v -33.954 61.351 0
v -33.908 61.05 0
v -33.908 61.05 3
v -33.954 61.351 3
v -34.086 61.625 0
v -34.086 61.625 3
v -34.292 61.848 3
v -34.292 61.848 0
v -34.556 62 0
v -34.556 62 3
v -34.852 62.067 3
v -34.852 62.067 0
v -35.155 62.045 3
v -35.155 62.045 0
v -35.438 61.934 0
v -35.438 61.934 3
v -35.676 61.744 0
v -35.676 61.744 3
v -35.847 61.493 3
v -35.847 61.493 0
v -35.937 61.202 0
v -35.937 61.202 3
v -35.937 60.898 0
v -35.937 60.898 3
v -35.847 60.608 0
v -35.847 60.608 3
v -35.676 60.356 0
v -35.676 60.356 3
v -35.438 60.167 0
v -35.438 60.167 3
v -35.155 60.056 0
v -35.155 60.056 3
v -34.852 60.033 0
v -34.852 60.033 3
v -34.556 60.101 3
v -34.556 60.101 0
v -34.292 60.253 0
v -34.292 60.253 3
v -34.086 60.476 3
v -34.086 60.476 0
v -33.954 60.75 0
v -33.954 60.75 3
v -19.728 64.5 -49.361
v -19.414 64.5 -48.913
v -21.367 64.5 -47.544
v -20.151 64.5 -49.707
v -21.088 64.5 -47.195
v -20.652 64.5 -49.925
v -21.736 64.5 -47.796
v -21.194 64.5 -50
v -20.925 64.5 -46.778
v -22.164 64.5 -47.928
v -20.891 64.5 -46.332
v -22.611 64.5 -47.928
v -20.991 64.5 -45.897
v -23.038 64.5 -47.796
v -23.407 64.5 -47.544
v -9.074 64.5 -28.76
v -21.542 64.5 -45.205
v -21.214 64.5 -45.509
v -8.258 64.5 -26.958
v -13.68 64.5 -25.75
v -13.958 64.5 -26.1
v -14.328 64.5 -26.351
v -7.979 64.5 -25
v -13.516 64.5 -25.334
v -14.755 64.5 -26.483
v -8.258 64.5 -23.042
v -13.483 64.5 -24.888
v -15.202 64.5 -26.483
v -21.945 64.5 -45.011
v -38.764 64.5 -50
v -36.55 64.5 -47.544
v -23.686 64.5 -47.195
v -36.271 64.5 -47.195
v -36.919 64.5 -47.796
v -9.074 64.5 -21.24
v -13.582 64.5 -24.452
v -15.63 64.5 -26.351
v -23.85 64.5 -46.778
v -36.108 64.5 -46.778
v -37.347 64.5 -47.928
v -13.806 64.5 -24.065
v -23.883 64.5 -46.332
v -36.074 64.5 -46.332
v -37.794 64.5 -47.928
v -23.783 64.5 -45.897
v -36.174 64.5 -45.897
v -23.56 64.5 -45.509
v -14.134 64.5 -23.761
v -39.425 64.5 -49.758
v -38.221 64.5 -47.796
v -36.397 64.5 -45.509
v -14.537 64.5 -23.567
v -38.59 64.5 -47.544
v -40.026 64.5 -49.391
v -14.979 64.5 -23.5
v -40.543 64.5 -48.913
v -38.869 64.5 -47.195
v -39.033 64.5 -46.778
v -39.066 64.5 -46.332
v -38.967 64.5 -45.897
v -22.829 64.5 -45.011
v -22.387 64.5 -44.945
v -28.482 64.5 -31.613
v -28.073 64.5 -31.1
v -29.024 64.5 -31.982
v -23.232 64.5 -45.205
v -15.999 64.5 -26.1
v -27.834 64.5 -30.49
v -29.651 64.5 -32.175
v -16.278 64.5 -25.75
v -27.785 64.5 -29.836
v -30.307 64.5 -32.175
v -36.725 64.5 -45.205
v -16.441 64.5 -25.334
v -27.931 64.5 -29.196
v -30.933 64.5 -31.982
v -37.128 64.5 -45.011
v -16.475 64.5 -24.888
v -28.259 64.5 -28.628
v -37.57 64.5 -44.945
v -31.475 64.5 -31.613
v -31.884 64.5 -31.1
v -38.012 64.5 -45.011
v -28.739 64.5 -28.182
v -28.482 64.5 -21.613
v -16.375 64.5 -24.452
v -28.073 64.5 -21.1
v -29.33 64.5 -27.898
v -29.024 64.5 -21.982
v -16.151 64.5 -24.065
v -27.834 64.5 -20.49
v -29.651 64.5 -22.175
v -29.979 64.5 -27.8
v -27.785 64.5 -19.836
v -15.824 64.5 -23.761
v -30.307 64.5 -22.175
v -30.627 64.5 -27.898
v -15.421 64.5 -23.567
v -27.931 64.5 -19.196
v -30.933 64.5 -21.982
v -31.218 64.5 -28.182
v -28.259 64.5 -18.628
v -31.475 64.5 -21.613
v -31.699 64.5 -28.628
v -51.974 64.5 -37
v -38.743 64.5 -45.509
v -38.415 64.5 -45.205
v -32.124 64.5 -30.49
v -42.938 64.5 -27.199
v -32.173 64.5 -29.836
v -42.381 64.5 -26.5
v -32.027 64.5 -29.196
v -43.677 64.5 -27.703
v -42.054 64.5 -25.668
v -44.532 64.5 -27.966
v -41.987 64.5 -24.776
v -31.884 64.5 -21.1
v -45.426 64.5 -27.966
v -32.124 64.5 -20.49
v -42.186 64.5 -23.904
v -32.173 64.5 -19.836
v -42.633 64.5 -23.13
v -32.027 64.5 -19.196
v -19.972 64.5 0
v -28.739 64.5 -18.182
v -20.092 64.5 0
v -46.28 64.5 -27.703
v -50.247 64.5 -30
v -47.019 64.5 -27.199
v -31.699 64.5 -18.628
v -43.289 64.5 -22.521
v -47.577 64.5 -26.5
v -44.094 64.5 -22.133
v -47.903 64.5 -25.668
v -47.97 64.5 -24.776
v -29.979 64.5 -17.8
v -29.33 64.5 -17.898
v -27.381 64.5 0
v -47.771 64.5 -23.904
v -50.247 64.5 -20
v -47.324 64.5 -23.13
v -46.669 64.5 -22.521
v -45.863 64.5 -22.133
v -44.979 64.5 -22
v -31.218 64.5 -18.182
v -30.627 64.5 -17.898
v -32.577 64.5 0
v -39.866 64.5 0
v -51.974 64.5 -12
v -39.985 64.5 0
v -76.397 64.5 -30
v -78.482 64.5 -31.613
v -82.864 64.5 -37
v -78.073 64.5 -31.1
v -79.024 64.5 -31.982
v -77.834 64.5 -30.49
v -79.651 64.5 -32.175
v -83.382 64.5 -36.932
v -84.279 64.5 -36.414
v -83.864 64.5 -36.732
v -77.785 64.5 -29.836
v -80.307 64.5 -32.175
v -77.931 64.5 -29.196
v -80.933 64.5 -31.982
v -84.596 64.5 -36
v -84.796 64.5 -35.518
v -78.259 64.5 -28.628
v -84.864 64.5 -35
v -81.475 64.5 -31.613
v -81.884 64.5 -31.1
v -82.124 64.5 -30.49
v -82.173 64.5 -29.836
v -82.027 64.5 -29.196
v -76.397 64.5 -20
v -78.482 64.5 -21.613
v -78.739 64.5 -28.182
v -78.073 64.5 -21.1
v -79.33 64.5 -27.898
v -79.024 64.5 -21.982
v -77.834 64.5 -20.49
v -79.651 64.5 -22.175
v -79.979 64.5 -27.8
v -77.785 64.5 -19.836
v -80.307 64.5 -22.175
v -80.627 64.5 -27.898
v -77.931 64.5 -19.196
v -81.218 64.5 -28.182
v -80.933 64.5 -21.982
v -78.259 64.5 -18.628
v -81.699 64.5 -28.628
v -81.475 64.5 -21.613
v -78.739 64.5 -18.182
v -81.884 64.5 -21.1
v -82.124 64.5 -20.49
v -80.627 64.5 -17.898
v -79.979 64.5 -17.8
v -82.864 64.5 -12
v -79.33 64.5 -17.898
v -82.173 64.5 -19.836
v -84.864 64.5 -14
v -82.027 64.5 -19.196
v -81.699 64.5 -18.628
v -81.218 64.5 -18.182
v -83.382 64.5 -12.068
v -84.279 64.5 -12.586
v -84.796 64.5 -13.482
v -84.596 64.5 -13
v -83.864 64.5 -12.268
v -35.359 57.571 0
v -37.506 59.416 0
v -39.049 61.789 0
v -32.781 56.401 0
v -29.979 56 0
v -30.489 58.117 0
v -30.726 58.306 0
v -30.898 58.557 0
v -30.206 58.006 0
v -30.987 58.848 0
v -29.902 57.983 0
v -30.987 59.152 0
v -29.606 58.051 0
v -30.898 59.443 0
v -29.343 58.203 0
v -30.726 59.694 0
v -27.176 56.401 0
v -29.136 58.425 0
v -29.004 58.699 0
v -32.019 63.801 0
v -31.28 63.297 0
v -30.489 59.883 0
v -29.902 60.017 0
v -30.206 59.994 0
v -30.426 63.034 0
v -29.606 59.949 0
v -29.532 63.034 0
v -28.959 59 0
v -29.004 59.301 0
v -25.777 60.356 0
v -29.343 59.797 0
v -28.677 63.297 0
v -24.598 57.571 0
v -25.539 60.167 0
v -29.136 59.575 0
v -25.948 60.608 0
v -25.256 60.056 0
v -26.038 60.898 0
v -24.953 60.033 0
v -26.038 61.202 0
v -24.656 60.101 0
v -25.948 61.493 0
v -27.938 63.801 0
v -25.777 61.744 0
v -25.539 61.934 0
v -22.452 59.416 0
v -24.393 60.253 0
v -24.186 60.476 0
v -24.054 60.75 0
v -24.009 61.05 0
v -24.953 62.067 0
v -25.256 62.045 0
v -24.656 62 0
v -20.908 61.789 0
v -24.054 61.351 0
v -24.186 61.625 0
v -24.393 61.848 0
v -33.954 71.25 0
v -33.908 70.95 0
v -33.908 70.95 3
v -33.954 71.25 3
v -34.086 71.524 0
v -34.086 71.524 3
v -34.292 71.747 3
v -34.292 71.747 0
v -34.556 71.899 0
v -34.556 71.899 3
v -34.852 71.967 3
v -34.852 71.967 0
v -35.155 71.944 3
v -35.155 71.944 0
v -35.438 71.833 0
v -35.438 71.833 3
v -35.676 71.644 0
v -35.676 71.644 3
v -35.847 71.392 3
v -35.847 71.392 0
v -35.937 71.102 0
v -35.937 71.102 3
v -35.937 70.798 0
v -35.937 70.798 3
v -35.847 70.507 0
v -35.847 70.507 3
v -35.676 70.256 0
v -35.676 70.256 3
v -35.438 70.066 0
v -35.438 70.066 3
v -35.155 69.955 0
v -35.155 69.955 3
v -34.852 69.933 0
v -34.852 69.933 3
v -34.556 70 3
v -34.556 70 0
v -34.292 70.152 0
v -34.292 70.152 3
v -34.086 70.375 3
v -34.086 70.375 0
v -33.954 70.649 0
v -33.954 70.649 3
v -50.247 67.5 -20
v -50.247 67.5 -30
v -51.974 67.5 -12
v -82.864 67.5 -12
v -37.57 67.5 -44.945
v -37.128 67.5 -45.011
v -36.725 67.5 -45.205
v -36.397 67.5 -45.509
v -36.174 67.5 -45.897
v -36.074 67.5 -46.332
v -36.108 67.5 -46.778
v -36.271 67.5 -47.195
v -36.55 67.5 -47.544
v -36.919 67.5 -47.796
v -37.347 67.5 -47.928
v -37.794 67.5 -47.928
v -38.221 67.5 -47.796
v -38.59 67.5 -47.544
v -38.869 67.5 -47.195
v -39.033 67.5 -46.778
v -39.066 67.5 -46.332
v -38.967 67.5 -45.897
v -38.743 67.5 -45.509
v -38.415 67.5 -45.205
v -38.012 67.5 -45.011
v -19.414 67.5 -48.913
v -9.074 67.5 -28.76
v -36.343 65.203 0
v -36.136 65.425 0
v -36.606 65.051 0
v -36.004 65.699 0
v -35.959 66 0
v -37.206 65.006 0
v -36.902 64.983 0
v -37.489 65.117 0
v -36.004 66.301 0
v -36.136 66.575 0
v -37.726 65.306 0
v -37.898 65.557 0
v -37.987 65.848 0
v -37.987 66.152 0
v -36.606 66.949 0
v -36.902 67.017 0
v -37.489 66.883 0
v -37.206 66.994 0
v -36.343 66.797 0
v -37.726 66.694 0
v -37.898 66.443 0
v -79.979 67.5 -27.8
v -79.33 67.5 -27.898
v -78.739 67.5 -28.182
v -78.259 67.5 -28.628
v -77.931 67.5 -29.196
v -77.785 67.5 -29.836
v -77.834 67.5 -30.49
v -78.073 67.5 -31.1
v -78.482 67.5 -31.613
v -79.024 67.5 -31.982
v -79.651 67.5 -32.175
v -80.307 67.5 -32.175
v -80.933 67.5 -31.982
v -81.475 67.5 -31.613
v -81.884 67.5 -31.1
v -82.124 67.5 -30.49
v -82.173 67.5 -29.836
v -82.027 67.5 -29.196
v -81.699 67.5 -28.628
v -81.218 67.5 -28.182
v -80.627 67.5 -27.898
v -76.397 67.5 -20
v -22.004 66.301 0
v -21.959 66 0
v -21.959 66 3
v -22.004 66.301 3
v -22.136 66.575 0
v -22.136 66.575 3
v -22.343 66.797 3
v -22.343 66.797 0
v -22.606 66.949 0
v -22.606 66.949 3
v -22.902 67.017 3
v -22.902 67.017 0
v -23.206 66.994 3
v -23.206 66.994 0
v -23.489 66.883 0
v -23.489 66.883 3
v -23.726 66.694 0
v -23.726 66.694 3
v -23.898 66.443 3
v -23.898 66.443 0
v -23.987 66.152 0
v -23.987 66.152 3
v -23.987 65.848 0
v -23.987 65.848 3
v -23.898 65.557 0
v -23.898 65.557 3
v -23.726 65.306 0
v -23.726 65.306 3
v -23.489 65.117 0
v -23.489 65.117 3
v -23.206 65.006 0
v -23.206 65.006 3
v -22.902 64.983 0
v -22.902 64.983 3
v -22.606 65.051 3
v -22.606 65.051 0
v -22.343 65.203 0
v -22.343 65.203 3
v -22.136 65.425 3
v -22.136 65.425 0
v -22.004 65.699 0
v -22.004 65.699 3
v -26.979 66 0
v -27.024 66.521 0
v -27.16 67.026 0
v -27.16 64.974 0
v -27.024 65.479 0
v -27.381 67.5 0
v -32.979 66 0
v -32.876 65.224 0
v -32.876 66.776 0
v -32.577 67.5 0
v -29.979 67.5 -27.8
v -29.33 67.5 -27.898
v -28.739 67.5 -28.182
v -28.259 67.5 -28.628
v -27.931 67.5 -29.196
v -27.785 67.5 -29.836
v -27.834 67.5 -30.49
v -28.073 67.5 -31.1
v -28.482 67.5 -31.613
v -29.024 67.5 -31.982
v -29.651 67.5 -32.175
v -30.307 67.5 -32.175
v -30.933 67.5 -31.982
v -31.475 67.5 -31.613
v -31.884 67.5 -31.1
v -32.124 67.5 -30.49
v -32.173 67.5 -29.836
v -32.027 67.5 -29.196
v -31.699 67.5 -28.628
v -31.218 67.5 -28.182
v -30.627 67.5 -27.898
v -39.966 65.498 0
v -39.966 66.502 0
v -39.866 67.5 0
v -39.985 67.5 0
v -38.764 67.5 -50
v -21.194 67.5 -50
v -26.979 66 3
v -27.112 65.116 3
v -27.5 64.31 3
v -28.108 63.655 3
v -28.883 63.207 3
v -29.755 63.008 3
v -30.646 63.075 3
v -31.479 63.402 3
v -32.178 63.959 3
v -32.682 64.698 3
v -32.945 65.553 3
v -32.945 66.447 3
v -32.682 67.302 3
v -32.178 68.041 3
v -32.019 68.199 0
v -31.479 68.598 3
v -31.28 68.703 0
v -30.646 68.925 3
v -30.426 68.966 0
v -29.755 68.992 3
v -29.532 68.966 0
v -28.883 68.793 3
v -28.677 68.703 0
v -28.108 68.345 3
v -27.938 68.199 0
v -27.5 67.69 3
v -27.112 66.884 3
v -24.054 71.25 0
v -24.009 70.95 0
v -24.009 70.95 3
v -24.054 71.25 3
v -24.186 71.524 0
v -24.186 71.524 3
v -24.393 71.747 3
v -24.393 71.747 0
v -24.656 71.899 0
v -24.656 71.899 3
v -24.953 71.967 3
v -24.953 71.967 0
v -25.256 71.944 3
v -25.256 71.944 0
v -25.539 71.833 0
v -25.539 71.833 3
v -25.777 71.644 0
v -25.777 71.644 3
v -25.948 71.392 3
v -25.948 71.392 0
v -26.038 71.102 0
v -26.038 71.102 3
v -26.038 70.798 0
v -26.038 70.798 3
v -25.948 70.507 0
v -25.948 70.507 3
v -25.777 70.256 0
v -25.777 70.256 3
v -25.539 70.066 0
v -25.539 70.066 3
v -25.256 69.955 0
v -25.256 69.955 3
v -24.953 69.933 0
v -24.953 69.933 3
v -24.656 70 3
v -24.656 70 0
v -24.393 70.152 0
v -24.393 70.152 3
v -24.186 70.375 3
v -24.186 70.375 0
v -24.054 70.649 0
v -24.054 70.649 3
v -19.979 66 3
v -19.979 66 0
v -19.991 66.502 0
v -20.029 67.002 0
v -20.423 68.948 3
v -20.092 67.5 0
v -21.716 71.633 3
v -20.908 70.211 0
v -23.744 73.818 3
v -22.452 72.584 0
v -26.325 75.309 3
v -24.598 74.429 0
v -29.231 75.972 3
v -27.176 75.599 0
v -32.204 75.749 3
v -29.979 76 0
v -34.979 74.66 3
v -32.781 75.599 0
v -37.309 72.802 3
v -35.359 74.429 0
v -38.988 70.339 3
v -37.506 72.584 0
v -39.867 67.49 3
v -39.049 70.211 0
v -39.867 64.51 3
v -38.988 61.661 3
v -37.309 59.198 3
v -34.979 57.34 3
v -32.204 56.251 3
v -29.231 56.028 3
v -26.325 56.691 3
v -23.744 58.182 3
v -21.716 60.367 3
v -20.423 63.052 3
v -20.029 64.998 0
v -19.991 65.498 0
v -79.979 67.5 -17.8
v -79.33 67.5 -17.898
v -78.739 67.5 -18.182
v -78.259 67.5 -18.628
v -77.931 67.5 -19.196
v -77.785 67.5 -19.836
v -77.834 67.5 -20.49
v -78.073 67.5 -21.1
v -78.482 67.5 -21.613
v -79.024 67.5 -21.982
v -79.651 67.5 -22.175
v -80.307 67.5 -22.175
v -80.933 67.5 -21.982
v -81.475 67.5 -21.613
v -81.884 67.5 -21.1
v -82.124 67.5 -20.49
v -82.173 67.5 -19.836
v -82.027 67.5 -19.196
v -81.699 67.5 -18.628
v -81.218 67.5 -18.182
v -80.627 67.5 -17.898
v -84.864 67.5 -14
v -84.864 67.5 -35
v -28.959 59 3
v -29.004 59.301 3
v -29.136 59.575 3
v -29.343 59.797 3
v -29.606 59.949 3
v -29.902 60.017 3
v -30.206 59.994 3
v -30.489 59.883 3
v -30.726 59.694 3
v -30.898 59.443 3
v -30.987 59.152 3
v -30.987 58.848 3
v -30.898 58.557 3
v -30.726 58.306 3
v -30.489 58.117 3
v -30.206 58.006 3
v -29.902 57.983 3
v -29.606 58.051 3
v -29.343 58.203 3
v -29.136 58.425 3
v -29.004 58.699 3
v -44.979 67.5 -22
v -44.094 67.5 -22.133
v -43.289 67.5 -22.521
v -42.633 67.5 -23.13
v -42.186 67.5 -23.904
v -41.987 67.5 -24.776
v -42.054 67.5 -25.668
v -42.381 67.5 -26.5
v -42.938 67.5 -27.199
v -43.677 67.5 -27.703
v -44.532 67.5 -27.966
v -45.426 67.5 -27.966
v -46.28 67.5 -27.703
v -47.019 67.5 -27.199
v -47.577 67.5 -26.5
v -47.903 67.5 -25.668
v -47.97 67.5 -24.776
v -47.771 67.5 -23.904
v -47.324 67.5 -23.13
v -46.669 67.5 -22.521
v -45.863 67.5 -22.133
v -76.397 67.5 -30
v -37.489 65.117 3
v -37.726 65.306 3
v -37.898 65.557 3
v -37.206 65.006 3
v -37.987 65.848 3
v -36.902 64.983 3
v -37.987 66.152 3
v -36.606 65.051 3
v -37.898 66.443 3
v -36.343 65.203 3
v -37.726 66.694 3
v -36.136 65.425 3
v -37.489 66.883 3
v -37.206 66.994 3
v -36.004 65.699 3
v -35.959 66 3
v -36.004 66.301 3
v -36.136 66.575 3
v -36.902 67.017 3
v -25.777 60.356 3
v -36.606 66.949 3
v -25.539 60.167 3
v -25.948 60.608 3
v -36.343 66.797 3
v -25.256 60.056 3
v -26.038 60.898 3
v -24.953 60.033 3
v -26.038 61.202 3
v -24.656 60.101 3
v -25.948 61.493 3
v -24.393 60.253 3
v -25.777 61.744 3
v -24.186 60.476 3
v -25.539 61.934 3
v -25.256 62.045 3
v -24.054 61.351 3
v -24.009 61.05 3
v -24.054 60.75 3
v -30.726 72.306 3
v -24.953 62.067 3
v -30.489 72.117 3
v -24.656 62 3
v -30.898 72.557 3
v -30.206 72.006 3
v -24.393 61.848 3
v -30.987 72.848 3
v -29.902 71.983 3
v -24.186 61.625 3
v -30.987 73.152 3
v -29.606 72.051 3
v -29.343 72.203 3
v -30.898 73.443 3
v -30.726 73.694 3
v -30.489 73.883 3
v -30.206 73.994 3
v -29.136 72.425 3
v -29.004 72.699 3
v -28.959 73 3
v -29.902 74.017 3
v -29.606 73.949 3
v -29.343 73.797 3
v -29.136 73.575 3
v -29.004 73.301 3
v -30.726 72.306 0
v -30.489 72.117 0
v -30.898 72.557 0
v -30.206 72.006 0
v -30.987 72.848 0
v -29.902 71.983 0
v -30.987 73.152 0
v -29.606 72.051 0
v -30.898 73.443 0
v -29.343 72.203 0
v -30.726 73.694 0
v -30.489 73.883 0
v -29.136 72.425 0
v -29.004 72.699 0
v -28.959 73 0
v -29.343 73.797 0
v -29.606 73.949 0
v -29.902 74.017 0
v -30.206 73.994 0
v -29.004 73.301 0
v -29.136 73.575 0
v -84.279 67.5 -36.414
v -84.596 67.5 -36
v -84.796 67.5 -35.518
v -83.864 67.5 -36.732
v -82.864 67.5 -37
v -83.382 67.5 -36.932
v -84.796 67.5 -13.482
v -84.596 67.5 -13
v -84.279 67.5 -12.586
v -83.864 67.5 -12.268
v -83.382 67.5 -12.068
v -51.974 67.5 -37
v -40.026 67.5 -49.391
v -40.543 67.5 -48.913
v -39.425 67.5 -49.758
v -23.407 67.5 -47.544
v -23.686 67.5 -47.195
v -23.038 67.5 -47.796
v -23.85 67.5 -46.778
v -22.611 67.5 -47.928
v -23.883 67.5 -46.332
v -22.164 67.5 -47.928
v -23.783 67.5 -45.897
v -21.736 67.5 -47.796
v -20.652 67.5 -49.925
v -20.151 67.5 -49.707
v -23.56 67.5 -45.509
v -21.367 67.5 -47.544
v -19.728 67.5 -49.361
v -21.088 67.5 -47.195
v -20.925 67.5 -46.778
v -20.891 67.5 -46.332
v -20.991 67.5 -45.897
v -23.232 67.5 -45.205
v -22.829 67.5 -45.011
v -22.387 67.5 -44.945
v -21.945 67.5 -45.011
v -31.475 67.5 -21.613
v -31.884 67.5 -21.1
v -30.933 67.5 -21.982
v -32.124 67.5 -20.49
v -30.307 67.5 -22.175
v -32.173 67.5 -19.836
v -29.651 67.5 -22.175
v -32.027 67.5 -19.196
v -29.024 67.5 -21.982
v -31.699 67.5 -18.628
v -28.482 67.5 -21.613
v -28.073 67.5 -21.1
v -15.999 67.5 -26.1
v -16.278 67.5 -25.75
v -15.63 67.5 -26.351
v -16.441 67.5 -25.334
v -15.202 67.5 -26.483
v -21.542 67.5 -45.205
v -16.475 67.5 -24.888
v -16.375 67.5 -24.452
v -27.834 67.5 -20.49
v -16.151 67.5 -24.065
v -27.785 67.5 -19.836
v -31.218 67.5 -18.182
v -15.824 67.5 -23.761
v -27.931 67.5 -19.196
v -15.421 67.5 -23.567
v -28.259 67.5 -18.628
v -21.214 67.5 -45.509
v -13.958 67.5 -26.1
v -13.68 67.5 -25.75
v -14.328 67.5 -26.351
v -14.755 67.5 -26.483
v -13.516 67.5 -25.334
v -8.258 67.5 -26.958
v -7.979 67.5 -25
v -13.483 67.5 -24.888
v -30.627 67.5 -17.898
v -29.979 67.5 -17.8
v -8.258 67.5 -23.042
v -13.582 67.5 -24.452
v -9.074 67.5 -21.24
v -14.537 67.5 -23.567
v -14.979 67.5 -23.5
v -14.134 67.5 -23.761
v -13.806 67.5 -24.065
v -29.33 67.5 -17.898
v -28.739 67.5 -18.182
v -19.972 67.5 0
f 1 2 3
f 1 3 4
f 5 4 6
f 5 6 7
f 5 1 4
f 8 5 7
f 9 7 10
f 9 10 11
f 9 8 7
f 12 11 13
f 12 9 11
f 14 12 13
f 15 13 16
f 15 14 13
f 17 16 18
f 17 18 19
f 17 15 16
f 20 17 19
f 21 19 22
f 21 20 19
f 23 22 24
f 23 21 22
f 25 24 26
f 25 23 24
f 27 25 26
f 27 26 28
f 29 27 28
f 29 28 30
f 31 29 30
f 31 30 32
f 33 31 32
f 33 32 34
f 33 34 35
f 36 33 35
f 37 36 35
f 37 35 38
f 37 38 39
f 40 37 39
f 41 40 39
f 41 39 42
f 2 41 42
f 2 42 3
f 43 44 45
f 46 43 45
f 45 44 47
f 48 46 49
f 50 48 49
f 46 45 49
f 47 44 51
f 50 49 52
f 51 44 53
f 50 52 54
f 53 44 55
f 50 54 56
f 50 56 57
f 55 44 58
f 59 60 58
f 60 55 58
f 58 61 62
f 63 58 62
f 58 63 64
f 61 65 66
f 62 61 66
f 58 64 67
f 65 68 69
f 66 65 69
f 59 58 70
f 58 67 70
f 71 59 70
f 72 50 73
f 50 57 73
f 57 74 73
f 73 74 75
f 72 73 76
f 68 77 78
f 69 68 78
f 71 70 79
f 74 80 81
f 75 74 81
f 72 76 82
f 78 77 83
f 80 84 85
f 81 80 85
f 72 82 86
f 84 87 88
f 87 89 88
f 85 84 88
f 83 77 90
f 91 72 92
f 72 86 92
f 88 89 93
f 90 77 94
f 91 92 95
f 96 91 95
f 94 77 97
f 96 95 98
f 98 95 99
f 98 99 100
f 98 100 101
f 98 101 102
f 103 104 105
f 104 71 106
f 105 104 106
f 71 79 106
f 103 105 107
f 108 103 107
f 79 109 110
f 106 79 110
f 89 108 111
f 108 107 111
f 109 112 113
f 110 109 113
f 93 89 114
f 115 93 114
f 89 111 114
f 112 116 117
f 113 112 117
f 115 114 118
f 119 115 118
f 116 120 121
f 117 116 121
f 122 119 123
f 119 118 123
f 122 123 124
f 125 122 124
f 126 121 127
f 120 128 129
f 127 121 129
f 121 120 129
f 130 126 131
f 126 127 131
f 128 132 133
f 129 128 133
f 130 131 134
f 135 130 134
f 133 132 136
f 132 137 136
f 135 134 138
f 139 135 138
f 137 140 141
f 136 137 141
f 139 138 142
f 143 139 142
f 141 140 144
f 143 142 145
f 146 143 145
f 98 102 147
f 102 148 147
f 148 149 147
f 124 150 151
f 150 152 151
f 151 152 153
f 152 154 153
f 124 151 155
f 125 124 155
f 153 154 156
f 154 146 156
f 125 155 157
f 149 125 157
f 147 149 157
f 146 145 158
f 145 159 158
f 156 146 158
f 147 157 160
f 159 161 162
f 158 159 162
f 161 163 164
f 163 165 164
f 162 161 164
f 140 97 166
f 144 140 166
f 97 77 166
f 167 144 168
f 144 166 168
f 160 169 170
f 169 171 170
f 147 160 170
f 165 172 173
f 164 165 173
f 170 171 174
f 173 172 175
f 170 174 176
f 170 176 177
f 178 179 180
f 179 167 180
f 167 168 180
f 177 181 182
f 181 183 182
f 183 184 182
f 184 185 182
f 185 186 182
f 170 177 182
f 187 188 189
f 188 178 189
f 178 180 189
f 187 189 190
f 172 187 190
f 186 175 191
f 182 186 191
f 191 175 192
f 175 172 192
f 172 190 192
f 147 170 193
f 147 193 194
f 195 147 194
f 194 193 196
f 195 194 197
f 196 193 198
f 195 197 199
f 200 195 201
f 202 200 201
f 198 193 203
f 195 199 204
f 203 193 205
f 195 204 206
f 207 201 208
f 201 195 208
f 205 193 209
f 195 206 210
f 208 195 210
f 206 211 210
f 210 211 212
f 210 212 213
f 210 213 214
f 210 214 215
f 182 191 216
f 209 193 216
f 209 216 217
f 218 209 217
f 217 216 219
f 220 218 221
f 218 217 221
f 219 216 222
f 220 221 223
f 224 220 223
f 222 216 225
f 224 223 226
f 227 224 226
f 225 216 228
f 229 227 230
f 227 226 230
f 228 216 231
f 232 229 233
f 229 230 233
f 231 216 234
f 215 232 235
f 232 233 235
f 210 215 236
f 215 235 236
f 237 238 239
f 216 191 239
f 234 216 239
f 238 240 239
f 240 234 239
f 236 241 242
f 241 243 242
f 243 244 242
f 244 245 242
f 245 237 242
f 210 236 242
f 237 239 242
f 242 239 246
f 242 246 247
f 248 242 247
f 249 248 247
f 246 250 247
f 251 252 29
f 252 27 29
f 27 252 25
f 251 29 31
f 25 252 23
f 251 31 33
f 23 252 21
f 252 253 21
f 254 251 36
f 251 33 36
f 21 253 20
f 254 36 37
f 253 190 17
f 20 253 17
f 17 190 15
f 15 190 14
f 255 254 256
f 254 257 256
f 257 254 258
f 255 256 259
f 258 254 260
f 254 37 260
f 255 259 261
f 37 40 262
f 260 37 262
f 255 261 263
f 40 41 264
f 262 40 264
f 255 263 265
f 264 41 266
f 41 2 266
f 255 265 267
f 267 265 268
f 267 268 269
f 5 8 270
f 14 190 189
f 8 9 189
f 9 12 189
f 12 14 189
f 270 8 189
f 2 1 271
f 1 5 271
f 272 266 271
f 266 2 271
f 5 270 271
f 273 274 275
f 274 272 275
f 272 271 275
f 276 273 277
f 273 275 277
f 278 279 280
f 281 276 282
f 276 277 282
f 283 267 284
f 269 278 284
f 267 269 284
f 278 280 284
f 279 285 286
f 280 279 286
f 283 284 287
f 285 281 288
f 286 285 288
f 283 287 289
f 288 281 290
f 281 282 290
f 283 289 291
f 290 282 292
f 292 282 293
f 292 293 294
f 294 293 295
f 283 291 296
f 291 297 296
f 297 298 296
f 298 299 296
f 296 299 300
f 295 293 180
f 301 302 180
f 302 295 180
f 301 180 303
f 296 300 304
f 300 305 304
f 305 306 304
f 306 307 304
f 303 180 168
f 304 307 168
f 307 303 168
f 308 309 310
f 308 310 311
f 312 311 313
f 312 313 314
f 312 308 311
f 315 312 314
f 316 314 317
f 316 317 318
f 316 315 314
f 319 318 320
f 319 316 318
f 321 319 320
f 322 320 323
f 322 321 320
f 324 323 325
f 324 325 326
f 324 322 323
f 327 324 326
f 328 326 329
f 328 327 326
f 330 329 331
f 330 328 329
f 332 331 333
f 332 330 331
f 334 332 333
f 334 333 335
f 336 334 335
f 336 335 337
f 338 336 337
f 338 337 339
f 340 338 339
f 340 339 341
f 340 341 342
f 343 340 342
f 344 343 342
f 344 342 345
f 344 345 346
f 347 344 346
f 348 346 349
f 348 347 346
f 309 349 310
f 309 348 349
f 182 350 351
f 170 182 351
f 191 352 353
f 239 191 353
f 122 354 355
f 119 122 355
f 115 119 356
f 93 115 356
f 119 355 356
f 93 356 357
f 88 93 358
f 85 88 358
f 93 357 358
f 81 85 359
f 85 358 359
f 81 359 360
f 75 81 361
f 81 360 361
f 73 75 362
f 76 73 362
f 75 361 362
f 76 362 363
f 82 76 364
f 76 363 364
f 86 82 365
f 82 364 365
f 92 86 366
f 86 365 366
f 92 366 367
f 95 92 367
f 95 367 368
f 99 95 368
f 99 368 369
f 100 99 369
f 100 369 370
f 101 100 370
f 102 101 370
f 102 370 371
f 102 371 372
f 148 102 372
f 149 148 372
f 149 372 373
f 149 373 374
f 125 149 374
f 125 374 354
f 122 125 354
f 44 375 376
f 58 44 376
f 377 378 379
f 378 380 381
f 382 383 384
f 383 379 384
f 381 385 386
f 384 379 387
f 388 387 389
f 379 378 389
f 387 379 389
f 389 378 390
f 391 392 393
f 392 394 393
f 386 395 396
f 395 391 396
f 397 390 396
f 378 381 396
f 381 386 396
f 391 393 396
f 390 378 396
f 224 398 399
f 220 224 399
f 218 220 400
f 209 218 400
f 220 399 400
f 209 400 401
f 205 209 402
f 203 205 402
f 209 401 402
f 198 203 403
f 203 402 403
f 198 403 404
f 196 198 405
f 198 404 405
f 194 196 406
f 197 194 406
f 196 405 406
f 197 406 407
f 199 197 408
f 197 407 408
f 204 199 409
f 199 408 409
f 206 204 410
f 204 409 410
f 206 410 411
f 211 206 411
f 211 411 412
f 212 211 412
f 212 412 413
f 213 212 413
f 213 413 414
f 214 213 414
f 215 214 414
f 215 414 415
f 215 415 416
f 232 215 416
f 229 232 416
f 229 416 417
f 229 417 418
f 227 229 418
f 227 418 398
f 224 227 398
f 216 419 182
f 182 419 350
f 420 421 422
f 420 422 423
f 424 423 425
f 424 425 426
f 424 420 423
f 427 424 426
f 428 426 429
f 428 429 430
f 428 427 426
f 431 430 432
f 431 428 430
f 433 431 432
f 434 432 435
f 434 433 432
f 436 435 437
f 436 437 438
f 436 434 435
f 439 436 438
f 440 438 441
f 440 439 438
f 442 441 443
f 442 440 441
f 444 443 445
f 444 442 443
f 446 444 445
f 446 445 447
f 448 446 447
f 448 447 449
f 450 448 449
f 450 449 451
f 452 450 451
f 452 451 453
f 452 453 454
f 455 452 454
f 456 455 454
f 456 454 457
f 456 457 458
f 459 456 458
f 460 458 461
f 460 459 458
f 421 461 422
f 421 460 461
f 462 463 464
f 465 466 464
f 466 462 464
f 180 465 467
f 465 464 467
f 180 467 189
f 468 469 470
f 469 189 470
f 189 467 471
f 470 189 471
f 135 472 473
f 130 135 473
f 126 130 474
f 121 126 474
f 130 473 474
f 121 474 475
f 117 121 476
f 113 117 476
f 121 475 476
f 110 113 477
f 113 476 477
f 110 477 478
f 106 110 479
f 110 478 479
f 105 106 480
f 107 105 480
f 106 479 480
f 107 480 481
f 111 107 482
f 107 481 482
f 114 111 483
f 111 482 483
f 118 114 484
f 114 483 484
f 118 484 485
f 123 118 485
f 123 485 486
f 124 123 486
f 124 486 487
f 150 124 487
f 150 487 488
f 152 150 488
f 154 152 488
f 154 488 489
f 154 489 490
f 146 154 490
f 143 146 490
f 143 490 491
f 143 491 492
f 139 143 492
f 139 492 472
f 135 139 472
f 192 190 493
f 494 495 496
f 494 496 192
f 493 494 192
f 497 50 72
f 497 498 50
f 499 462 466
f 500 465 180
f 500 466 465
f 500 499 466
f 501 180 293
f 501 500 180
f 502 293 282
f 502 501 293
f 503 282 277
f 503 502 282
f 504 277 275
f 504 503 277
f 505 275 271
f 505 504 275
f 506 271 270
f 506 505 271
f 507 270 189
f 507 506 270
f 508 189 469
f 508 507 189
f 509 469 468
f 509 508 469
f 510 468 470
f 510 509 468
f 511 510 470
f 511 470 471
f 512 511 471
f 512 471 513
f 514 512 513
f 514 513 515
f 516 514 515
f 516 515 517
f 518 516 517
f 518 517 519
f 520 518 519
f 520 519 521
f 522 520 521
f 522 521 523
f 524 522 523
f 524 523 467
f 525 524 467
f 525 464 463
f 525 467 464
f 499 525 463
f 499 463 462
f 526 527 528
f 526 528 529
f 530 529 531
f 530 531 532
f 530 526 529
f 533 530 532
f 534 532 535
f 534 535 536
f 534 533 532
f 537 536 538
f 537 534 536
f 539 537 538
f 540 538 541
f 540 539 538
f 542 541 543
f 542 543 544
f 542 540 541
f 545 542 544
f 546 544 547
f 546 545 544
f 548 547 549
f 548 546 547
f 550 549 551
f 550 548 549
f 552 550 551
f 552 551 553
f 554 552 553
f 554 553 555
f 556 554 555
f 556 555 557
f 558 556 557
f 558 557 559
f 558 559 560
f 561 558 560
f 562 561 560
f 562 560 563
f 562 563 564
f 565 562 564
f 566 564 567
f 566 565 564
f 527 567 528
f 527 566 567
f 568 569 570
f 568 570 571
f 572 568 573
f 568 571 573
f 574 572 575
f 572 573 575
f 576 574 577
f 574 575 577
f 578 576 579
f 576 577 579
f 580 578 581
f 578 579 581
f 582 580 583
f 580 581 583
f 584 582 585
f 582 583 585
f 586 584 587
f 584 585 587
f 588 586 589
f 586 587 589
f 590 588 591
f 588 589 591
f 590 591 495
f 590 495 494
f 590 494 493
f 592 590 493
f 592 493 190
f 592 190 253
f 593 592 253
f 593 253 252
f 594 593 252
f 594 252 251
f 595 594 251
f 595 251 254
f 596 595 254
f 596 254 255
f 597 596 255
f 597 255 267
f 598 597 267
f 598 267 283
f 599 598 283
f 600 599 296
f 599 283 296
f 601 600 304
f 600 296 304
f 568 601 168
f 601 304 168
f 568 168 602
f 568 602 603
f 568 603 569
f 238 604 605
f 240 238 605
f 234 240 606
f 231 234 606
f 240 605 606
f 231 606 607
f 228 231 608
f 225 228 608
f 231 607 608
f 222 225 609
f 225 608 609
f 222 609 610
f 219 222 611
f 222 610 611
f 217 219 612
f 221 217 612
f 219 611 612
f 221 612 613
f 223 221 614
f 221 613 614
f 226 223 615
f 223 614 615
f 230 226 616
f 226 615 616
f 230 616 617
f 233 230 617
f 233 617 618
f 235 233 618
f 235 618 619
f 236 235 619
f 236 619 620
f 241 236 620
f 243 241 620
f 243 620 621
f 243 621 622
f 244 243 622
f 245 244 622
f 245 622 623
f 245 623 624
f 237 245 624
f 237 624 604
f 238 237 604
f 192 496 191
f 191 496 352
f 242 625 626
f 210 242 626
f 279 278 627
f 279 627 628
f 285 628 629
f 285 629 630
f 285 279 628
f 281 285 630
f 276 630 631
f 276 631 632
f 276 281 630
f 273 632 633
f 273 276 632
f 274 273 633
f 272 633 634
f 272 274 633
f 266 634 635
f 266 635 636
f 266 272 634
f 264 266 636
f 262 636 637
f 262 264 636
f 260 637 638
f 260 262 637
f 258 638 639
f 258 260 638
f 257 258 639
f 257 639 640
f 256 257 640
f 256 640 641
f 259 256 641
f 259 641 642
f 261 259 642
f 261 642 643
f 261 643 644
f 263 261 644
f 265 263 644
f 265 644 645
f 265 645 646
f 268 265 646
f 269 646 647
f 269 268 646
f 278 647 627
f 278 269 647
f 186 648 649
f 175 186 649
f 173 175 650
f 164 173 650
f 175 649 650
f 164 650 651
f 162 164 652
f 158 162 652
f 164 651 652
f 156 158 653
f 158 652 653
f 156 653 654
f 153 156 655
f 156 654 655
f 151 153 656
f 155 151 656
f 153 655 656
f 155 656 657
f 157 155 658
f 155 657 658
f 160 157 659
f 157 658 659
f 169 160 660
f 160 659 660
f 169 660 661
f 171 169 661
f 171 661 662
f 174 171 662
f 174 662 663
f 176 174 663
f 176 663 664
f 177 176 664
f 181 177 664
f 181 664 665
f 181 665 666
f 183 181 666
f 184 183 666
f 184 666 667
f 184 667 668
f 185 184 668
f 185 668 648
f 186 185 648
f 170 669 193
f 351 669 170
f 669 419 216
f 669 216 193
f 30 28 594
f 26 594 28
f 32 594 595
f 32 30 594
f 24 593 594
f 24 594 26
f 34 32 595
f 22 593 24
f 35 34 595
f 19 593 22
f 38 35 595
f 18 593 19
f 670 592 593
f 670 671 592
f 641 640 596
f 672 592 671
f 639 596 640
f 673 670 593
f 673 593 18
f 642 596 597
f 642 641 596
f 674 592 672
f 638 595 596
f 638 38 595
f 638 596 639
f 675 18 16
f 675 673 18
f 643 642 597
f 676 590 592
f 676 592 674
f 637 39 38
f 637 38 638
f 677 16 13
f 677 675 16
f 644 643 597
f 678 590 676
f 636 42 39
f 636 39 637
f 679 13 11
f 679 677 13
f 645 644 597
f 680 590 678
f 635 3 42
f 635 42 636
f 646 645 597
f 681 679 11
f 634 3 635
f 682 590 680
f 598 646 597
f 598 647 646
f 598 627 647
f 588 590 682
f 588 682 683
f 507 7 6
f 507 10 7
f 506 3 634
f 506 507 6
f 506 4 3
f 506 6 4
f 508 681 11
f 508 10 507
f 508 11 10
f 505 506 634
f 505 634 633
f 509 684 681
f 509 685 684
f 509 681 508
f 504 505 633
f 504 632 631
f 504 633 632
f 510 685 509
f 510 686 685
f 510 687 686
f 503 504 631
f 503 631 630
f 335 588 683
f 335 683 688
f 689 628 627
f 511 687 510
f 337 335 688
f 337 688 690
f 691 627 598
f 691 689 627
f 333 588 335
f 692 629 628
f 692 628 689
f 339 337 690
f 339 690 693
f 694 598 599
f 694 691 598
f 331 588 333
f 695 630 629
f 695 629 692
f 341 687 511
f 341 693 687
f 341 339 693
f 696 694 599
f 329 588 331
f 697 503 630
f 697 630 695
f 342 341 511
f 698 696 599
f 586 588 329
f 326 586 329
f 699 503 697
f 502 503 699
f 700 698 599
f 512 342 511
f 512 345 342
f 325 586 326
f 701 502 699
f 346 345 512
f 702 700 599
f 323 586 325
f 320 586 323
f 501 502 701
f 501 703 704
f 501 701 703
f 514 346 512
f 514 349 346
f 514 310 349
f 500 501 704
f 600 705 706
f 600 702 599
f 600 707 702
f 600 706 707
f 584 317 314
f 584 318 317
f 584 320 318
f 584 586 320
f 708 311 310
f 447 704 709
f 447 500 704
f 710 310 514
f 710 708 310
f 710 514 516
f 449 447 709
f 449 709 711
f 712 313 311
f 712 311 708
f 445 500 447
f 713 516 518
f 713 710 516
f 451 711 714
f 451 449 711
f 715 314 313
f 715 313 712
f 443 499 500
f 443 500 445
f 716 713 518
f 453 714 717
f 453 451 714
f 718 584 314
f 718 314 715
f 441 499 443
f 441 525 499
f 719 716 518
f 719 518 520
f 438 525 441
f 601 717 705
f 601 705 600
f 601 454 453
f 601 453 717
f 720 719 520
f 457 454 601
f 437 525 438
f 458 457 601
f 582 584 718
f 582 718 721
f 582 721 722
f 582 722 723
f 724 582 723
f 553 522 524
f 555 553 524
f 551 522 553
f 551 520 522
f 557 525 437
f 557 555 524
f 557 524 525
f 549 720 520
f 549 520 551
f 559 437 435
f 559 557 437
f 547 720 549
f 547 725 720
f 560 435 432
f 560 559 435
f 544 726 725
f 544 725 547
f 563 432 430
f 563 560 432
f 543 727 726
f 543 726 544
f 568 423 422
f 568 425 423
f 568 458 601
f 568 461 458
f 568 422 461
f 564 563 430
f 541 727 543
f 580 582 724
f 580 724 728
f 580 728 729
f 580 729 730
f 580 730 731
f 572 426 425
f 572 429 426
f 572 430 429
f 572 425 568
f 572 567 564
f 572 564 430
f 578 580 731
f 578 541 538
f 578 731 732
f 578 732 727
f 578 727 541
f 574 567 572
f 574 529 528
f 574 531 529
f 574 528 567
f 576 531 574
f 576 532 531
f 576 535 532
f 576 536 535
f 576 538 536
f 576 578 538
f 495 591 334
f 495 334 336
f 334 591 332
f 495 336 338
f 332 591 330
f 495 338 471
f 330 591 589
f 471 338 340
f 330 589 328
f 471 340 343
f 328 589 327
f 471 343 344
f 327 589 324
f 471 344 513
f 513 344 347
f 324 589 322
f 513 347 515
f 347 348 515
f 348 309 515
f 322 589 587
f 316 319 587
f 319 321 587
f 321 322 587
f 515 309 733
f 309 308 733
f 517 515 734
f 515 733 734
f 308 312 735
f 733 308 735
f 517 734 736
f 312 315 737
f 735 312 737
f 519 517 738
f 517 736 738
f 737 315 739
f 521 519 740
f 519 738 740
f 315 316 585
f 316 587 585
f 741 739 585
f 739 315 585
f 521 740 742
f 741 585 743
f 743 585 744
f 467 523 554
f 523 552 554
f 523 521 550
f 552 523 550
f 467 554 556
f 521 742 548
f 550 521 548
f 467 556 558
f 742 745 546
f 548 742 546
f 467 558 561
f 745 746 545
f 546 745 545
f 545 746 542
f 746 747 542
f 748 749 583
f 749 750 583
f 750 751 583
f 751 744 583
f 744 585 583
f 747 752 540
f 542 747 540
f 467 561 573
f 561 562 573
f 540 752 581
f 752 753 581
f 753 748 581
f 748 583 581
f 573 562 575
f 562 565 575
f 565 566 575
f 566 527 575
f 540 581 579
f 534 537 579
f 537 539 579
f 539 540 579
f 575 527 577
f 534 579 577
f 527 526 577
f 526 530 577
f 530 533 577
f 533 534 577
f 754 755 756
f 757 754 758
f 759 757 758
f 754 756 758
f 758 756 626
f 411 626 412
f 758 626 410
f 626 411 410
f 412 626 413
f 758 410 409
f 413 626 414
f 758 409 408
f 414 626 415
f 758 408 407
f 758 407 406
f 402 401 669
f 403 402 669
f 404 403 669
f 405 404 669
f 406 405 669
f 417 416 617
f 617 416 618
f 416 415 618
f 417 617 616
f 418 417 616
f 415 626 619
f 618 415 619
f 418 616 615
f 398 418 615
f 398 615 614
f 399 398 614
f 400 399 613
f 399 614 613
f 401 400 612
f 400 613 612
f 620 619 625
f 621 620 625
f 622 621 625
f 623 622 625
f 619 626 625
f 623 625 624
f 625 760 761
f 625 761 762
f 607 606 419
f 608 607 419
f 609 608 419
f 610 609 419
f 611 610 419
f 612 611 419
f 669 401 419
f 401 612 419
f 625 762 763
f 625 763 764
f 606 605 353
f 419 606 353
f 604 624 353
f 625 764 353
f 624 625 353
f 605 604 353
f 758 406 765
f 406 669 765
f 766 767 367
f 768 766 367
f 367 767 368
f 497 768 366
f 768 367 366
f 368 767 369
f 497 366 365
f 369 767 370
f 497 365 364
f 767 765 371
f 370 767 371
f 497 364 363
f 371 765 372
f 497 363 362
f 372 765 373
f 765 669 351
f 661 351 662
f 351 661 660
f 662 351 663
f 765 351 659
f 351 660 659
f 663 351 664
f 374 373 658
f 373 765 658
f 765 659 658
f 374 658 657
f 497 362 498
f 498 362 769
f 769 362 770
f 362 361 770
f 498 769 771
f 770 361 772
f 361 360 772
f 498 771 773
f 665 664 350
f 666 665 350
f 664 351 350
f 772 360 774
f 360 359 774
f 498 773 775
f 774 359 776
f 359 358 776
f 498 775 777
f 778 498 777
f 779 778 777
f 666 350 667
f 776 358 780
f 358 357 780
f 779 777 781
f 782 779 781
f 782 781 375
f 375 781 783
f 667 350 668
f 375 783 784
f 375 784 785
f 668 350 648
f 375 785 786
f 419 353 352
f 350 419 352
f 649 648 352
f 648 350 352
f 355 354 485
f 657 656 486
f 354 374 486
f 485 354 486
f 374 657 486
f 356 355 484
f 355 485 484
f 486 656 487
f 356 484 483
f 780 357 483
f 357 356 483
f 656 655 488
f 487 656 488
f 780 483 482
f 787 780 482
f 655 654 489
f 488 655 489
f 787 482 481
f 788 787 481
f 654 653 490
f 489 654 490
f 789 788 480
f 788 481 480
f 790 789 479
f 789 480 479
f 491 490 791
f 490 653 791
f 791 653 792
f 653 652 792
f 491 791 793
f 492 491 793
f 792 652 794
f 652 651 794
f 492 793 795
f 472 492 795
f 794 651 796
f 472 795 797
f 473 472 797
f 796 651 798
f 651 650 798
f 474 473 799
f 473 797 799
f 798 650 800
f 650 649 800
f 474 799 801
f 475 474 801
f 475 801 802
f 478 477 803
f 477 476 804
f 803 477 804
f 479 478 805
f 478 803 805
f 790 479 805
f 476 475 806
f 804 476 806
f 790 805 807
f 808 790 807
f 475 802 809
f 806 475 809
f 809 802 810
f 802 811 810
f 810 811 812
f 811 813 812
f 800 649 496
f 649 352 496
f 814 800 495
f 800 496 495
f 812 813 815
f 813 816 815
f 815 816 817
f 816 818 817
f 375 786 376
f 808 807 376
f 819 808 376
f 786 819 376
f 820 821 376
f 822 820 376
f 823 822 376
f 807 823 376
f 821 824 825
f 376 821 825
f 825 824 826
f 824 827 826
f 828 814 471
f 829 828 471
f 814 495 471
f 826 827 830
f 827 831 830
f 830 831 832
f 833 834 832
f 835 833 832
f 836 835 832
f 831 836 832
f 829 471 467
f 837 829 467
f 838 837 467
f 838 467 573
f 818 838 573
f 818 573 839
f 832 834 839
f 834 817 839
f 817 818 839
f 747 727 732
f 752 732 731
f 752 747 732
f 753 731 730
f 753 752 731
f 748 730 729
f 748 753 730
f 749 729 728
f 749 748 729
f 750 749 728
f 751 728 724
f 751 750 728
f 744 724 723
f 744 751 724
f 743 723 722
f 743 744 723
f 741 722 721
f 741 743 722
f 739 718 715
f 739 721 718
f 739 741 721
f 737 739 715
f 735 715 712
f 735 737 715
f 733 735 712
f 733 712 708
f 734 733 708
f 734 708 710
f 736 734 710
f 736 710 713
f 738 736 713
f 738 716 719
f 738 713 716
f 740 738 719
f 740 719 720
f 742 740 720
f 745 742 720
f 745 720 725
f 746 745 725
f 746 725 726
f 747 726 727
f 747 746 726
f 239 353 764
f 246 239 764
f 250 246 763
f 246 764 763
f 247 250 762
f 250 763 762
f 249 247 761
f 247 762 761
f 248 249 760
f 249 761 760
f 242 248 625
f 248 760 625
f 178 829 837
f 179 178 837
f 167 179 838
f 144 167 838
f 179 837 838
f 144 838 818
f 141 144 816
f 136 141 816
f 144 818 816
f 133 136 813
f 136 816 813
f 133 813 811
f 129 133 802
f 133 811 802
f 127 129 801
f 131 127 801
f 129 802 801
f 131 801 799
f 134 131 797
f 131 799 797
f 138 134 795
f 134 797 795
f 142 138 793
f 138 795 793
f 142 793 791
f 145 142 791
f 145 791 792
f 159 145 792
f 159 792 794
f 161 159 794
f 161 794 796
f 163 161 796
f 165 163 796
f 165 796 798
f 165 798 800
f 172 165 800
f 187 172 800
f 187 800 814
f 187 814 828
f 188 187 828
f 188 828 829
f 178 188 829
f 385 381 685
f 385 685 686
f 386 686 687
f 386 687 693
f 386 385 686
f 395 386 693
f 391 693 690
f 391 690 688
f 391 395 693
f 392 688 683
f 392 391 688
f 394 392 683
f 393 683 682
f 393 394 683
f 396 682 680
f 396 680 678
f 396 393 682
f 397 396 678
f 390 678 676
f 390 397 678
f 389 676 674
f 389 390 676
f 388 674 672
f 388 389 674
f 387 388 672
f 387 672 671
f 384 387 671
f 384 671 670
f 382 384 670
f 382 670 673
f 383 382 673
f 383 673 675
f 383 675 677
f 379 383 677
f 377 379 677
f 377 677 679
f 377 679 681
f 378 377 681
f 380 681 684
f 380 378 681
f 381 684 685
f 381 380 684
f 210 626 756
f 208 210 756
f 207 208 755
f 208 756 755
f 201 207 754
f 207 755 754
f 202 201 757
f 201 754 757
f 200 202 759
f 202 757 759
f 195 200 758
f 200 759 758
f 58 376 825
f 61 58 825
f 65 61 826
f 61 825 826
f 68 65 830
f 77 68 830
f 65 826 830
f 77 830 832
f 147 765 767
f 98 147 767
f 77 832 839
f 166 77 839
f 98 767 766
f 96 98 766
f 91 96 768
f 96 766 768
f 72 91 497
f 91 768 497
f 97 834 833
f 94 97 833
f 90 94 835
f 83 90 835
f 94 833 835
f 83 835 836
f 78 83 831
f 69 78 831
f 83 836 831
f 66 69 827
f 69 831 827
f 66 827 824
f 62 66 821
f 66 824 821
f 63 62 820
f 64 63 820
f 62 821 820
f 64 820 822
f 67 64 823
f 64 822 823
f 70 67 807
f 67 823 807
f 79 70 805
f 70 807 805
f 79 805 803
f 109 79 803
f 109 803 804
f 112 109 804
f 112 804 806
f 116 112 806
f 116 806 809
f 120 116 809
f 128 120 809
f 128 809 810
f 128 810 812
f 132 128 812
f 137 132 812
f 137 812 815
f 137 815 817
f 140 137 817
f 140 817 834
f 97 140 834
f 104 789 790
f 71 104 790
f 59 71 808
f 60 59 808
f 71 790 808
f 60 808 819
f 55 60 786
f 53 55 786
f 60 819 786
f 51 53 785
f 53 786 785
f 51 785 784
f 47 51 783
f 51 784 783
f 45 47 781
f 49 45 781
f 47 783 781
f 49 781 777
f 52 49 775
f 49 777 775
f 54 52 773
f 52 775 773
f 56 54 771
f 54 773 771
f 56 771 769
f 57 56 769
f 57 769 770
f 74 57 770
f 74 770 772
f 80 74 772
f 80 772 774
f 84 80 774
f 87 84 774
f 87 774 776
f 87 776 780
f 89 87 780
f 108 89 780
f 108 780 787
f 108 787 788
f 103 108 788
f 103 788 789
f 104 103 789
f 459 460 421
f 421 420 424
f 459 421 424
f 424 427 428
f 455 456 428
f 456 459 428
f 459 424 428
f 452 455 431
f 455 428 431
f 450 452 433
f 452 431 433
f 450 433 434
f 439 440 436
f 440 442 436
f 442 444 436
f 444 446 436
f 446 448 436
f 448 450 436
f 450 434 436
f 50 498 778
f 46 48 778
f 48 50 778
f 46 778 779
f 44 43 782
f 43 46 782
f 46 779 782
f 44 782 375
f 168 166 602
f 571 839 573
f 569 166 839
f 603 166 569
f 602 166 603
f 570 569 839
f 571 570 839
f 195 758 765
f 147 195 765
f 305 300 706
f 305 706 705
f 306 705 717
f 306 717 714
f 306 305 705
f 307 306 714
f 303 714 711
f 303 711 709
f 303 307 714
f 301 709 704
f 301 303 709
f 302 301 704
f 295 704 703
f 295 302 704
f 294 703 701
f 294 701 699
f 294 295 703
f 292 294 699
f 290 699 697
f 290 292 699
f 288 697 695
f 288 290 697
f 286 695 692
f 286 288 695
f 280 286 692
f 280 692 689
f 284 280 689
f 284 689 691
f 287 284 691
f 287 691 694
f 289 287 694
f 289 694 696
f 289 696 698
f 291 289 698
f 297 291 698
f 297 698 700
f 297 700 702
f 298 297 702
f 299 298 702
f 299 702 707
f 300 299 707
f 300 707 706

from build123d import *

# Parameters (mm, degrees)
SKETCH_1_R               = 10
SKETCH_1_R_2             = 1.02
SKETCH_1_R_3             = 1.5
EXTRUDE_1_DEPTH          = 3
SKETCH_2_R               = 5
EXTRUDE_2_DEPTH          = 1
CUT_EXTRUDE_1_DEPTH      = 10
CUT_EXTRUDE_1_DEPTH_BACK = 0.5
SKETCH_3_R               = 3
SKETCH_4_R               = 1.5
CUT_EXTRUDE_2_DEPTH      = 8.5
CUT_EXTRUDE_START        = -10
SKETCH_5_R               = 3
CUT_EXTRUDE_3_DEPTH      = 10
EXTRUDE_3_DEPTH          = 50
SKETCH_7_W               = 26.150152834
SKETCH_7_H               = 10
SKETCH_7_R               = 1.5
SKETCH_7_R_2             = 3
SKETCH_7_R_3             = 2.2
CUT_EXTRUDE_8_DEPTH      = 50
SKETCH_9_W               = 3.765706055
SKETCH_9_H               = 11.940159279
CUT_EXTRUDE_9_DEPTH      = 50


with BuildPart() as part:
    # ｽｹｯﾁ1 → ﾎﾞｽ - 押し出し1 (new body)
    with BuildSketch(Plane.XY):
        with Locations((-29.978703949, 66)):
            Circle(SKETCH_1_R)
        with Locations((-25.028956481, 61.050252532)):
            Circle(SKETCH_1_R_2, mode=Mode.SUBTRACT)
        with Locations((-29.978703949, 59)):
            Circle(SKETCH_1_R_2, mode=Mode.SUBTRACT)
        with Locations((-34.928451418, 61.050252532)):
            Circle(SKETCH_1_R_2, mode=Mode.SUBTRACT)
        with Locations((-36.978703949, 66)):
            Circle(SKETCH_1_R_2, mode=Mode.SUBTRACT)
        with Locations((-34.928451418, 70.949747468)):
            Circle(SKETCH_1_R_2, mode=Mode.SUBTRACT)
        with Locations((-29.978703949, 73)):
            Circle(SKETCH_1_R_2, mode=Mode.SUBTRACT)
        with Locations((-25.028956481, 70.949747468)):
            Circle(SKETCH_1_R_2, mode=Mode.SUBTRACT)
        with Locations((-22.978703949, 66)):
            Circle(SKETCH_1_R_2, mode=Mode.SUBTRACT)
        with Locations((-29.978703949, 66)):
            Circle(SKETCH_1_R_3, mode=Mode.SUBTRACT)
    extrude(amount=EXTRUDE_1_DEPTH)

    # ｽｹｯﾁ2 → ﾎﾞｽ - 押し出し2 (add)
    with BuildSketch(Plane.XY.offset(3)):
        with Locations((-29.978703949, 66)):
            Circle(SKETCH_2_R)
    extrude(amount=EXTRUDE_2_DEPTH)

    # ｽｹｯﾁ3 → ｶｯﾄ - 押し出し1 (cut, two sides: drawn at the far end of the back side and taken through both)
    with BuildSketch(Plane(origin=(0, 0, 3), x_dir=(-1, 0, 0), z_dir=(0, 0, -1)).offset(-CUT_EXTRUDE_1_DEPTH_BACK)):
        with Locations(Location((29.978703949, 66, 0), (0, 0, 180))):
            Circle(SKETCH_3_R)
    extrude(amount=CUT_EXTRUDE_1_DEPTH + CUT_EXTRUDE_1_DEPTH_BACK, mode=Mode.SUBTRACT)

    # ｽｹｯﾁ4 → ｶｯﾄ - 押し出し2 (cut)
    with BuildSketch(Plane(origin=(0, 0, 3.5), x_dir=(-1, 0, 0), z_dir=(0, 0, -1))):
        with Locations((29.978703949, 66)):
            Circle(SKETCH_4_R)
    extrude(amount=-CUT_EXTRUDE_2_DEPTH, mode=Mode.SUBTRACT)

    # ｽｹｯﾁ5 → ｶｯﾄ - 押し出し3 (cut)
    with BuildSketch(Plane(origin=(0, 0, 0), x_dir=(-1, 0, 0), z_dir=(0, 0, -1)).offset(CUT_EXTRUDE_START)):
        with Locations(Location((29.978703949, 66, 0), (0, 0, 180))):
            Circle(SKETCH_5_R)
    extrude(amount=CUT_EXTRUDE_3_DEPTH, mode=Mode.SUBTRACT)

    # ｽｹｯﾁ6 → ﾎﾞｽ - 押し出し3 (add)
    with BuildSketch(Plane(origin=(0, 0, 0), x_dir=(-1, 0, 0), z_dir=(0, 0, -1))):
        Polygon((29.978703949, 64.5), (89.978703949, 64.5), (89.978703949, 67.5), (29.978703949, 67.5), (7.978703949, 67.5), (7.978703949, 64.5), align=None)
    extrude(amount=EXTRUDE_3_DEPTH)

    # ｽｹｯﾁ7 → ｶｯﾄ - 押し出し8 (cut)
    with BuildSketch(Plane(origin=(0, 67.5, 0), x_dir=(1, 0, 0), z_dir=(0, 1, 0))):
        with BuildLine():
            Line((-100.145182103, -3.51175574), (-39.985484803, 0))
            Line((-39.985484803, 0), (-51.974034344, 12))
            Line((-51.974034344, 12), (-82.864348742, 12))
            ThreePointArc((-82.864348742, 12), (-84.278562304, 12.585786438), (-84.864348742, 14))
            Line((-84.864348742, 14), (-84.864348742, 35))
            ThreePointArc((-84.864348742, 35), (-84.278562304, 36.414213562), (-82.864348742, 37))
            Line((-82.864348742, 37), (-51.974034344, 37))
            Line((-51.974034344, 37), (-40.543200867, 48.912989303))
            ThreePointArc((-40.543200867, 48.912989303), (-39.734398684, 49.588968373), (-38.763748554, 50))
            Line((-38.763748554, 50), (-38.44069987, 54.873631325))
            Line((-38.44069987, 54.873631325), (-103.044452856, 56.708369205))
            Line((-103.044452856, 56.708369205), (-100.145182103, -3.51175574))
        make_face()
        with BuildLine():
            Line((-19.971923095, 56.200079543), (-21.193659345, 50))
            ThreePointArc((-21.193659345, 50), (-20.151061293, 49.706748166), (-19.414207032, 48.912989303))
            Line((-19.414207032, 48.912989303), (-9.074178765, 28.759864671))
            ThreePointArc((-9.074178765, 28.759864671), (-7.978703949, 25), (-9.074178765, 21.240135329))
            Line((-9.074178765, 21.240135329), (-19.971923095, 0))
            Line((-19.971923095, 0), (8.860799546, -5.1085516))
            Line((8.860799546, -5.1085516), (11.142393262, 56.200079543))
            Line((11.142393262, 56.200079543), (-19.971923095, 56.200079543))
        make_face()
        with Locations((-63.322025342, 25)):
            Rectangle(SKETCH_7_W, SKETCH_7_H)
        with Locations(Location((-14.978703949, 25, 0), (0, 0, 270))):
            Circle(SKETCH_7_R)
        with Locations(Location((-22.387170595, 46.444557629, 0), (0, 0, 270))):
            Circle(SKETCH_7_R)
        with Locations(Location((-37.570237303, 46.444557629, 0), (0, 0, 270))):
            Circle(SKETCH_7_R)
        with Locations(Location((-44.978703949, 25, 0), (0, 0, 270))):
            Circle(SKETCH_7_R_2)
        with Locations(Location((-79.978703949, 30, 0), (0, 0, 270))):
            Circle(SKETCH_7_R_3)
        with Locations(Location((-79.978703949, 20, 0), (0, 0, 270))):
            Circle(SKETCH_7_R_3)
        with Locations(Location((-29.978703949, 30, 0), (0, 0, 270))):
            Circle(SKETCH_7_R_3)
        with Locations(Location((-29.978703949, 20, 0), (0, 0, 270))):
            Circle(SKETCH_7_R_3)
    extrude(amount=-CUT_EXTRUDE_8_DEPTH, mode=Mode.SUBTRACT)

    # ｽｹｯﾁ9 → ｶｯﾄ - 押し出し9 (cut)
    with BuildSketch(Plane(origin=(0, 0, 0), x_dir=(0, 0, -1), z_dir=(1, 0, 0))):
        with Locations((-4.882853028, 66.970079639)):
            Rectangle(SKETCH_9_W, SKETCH_9_H)
    extrude(amount=-CUT_EXTRUDE_9_DEPTH, mode=Mode.SUBTRACT)


solid = part.part
